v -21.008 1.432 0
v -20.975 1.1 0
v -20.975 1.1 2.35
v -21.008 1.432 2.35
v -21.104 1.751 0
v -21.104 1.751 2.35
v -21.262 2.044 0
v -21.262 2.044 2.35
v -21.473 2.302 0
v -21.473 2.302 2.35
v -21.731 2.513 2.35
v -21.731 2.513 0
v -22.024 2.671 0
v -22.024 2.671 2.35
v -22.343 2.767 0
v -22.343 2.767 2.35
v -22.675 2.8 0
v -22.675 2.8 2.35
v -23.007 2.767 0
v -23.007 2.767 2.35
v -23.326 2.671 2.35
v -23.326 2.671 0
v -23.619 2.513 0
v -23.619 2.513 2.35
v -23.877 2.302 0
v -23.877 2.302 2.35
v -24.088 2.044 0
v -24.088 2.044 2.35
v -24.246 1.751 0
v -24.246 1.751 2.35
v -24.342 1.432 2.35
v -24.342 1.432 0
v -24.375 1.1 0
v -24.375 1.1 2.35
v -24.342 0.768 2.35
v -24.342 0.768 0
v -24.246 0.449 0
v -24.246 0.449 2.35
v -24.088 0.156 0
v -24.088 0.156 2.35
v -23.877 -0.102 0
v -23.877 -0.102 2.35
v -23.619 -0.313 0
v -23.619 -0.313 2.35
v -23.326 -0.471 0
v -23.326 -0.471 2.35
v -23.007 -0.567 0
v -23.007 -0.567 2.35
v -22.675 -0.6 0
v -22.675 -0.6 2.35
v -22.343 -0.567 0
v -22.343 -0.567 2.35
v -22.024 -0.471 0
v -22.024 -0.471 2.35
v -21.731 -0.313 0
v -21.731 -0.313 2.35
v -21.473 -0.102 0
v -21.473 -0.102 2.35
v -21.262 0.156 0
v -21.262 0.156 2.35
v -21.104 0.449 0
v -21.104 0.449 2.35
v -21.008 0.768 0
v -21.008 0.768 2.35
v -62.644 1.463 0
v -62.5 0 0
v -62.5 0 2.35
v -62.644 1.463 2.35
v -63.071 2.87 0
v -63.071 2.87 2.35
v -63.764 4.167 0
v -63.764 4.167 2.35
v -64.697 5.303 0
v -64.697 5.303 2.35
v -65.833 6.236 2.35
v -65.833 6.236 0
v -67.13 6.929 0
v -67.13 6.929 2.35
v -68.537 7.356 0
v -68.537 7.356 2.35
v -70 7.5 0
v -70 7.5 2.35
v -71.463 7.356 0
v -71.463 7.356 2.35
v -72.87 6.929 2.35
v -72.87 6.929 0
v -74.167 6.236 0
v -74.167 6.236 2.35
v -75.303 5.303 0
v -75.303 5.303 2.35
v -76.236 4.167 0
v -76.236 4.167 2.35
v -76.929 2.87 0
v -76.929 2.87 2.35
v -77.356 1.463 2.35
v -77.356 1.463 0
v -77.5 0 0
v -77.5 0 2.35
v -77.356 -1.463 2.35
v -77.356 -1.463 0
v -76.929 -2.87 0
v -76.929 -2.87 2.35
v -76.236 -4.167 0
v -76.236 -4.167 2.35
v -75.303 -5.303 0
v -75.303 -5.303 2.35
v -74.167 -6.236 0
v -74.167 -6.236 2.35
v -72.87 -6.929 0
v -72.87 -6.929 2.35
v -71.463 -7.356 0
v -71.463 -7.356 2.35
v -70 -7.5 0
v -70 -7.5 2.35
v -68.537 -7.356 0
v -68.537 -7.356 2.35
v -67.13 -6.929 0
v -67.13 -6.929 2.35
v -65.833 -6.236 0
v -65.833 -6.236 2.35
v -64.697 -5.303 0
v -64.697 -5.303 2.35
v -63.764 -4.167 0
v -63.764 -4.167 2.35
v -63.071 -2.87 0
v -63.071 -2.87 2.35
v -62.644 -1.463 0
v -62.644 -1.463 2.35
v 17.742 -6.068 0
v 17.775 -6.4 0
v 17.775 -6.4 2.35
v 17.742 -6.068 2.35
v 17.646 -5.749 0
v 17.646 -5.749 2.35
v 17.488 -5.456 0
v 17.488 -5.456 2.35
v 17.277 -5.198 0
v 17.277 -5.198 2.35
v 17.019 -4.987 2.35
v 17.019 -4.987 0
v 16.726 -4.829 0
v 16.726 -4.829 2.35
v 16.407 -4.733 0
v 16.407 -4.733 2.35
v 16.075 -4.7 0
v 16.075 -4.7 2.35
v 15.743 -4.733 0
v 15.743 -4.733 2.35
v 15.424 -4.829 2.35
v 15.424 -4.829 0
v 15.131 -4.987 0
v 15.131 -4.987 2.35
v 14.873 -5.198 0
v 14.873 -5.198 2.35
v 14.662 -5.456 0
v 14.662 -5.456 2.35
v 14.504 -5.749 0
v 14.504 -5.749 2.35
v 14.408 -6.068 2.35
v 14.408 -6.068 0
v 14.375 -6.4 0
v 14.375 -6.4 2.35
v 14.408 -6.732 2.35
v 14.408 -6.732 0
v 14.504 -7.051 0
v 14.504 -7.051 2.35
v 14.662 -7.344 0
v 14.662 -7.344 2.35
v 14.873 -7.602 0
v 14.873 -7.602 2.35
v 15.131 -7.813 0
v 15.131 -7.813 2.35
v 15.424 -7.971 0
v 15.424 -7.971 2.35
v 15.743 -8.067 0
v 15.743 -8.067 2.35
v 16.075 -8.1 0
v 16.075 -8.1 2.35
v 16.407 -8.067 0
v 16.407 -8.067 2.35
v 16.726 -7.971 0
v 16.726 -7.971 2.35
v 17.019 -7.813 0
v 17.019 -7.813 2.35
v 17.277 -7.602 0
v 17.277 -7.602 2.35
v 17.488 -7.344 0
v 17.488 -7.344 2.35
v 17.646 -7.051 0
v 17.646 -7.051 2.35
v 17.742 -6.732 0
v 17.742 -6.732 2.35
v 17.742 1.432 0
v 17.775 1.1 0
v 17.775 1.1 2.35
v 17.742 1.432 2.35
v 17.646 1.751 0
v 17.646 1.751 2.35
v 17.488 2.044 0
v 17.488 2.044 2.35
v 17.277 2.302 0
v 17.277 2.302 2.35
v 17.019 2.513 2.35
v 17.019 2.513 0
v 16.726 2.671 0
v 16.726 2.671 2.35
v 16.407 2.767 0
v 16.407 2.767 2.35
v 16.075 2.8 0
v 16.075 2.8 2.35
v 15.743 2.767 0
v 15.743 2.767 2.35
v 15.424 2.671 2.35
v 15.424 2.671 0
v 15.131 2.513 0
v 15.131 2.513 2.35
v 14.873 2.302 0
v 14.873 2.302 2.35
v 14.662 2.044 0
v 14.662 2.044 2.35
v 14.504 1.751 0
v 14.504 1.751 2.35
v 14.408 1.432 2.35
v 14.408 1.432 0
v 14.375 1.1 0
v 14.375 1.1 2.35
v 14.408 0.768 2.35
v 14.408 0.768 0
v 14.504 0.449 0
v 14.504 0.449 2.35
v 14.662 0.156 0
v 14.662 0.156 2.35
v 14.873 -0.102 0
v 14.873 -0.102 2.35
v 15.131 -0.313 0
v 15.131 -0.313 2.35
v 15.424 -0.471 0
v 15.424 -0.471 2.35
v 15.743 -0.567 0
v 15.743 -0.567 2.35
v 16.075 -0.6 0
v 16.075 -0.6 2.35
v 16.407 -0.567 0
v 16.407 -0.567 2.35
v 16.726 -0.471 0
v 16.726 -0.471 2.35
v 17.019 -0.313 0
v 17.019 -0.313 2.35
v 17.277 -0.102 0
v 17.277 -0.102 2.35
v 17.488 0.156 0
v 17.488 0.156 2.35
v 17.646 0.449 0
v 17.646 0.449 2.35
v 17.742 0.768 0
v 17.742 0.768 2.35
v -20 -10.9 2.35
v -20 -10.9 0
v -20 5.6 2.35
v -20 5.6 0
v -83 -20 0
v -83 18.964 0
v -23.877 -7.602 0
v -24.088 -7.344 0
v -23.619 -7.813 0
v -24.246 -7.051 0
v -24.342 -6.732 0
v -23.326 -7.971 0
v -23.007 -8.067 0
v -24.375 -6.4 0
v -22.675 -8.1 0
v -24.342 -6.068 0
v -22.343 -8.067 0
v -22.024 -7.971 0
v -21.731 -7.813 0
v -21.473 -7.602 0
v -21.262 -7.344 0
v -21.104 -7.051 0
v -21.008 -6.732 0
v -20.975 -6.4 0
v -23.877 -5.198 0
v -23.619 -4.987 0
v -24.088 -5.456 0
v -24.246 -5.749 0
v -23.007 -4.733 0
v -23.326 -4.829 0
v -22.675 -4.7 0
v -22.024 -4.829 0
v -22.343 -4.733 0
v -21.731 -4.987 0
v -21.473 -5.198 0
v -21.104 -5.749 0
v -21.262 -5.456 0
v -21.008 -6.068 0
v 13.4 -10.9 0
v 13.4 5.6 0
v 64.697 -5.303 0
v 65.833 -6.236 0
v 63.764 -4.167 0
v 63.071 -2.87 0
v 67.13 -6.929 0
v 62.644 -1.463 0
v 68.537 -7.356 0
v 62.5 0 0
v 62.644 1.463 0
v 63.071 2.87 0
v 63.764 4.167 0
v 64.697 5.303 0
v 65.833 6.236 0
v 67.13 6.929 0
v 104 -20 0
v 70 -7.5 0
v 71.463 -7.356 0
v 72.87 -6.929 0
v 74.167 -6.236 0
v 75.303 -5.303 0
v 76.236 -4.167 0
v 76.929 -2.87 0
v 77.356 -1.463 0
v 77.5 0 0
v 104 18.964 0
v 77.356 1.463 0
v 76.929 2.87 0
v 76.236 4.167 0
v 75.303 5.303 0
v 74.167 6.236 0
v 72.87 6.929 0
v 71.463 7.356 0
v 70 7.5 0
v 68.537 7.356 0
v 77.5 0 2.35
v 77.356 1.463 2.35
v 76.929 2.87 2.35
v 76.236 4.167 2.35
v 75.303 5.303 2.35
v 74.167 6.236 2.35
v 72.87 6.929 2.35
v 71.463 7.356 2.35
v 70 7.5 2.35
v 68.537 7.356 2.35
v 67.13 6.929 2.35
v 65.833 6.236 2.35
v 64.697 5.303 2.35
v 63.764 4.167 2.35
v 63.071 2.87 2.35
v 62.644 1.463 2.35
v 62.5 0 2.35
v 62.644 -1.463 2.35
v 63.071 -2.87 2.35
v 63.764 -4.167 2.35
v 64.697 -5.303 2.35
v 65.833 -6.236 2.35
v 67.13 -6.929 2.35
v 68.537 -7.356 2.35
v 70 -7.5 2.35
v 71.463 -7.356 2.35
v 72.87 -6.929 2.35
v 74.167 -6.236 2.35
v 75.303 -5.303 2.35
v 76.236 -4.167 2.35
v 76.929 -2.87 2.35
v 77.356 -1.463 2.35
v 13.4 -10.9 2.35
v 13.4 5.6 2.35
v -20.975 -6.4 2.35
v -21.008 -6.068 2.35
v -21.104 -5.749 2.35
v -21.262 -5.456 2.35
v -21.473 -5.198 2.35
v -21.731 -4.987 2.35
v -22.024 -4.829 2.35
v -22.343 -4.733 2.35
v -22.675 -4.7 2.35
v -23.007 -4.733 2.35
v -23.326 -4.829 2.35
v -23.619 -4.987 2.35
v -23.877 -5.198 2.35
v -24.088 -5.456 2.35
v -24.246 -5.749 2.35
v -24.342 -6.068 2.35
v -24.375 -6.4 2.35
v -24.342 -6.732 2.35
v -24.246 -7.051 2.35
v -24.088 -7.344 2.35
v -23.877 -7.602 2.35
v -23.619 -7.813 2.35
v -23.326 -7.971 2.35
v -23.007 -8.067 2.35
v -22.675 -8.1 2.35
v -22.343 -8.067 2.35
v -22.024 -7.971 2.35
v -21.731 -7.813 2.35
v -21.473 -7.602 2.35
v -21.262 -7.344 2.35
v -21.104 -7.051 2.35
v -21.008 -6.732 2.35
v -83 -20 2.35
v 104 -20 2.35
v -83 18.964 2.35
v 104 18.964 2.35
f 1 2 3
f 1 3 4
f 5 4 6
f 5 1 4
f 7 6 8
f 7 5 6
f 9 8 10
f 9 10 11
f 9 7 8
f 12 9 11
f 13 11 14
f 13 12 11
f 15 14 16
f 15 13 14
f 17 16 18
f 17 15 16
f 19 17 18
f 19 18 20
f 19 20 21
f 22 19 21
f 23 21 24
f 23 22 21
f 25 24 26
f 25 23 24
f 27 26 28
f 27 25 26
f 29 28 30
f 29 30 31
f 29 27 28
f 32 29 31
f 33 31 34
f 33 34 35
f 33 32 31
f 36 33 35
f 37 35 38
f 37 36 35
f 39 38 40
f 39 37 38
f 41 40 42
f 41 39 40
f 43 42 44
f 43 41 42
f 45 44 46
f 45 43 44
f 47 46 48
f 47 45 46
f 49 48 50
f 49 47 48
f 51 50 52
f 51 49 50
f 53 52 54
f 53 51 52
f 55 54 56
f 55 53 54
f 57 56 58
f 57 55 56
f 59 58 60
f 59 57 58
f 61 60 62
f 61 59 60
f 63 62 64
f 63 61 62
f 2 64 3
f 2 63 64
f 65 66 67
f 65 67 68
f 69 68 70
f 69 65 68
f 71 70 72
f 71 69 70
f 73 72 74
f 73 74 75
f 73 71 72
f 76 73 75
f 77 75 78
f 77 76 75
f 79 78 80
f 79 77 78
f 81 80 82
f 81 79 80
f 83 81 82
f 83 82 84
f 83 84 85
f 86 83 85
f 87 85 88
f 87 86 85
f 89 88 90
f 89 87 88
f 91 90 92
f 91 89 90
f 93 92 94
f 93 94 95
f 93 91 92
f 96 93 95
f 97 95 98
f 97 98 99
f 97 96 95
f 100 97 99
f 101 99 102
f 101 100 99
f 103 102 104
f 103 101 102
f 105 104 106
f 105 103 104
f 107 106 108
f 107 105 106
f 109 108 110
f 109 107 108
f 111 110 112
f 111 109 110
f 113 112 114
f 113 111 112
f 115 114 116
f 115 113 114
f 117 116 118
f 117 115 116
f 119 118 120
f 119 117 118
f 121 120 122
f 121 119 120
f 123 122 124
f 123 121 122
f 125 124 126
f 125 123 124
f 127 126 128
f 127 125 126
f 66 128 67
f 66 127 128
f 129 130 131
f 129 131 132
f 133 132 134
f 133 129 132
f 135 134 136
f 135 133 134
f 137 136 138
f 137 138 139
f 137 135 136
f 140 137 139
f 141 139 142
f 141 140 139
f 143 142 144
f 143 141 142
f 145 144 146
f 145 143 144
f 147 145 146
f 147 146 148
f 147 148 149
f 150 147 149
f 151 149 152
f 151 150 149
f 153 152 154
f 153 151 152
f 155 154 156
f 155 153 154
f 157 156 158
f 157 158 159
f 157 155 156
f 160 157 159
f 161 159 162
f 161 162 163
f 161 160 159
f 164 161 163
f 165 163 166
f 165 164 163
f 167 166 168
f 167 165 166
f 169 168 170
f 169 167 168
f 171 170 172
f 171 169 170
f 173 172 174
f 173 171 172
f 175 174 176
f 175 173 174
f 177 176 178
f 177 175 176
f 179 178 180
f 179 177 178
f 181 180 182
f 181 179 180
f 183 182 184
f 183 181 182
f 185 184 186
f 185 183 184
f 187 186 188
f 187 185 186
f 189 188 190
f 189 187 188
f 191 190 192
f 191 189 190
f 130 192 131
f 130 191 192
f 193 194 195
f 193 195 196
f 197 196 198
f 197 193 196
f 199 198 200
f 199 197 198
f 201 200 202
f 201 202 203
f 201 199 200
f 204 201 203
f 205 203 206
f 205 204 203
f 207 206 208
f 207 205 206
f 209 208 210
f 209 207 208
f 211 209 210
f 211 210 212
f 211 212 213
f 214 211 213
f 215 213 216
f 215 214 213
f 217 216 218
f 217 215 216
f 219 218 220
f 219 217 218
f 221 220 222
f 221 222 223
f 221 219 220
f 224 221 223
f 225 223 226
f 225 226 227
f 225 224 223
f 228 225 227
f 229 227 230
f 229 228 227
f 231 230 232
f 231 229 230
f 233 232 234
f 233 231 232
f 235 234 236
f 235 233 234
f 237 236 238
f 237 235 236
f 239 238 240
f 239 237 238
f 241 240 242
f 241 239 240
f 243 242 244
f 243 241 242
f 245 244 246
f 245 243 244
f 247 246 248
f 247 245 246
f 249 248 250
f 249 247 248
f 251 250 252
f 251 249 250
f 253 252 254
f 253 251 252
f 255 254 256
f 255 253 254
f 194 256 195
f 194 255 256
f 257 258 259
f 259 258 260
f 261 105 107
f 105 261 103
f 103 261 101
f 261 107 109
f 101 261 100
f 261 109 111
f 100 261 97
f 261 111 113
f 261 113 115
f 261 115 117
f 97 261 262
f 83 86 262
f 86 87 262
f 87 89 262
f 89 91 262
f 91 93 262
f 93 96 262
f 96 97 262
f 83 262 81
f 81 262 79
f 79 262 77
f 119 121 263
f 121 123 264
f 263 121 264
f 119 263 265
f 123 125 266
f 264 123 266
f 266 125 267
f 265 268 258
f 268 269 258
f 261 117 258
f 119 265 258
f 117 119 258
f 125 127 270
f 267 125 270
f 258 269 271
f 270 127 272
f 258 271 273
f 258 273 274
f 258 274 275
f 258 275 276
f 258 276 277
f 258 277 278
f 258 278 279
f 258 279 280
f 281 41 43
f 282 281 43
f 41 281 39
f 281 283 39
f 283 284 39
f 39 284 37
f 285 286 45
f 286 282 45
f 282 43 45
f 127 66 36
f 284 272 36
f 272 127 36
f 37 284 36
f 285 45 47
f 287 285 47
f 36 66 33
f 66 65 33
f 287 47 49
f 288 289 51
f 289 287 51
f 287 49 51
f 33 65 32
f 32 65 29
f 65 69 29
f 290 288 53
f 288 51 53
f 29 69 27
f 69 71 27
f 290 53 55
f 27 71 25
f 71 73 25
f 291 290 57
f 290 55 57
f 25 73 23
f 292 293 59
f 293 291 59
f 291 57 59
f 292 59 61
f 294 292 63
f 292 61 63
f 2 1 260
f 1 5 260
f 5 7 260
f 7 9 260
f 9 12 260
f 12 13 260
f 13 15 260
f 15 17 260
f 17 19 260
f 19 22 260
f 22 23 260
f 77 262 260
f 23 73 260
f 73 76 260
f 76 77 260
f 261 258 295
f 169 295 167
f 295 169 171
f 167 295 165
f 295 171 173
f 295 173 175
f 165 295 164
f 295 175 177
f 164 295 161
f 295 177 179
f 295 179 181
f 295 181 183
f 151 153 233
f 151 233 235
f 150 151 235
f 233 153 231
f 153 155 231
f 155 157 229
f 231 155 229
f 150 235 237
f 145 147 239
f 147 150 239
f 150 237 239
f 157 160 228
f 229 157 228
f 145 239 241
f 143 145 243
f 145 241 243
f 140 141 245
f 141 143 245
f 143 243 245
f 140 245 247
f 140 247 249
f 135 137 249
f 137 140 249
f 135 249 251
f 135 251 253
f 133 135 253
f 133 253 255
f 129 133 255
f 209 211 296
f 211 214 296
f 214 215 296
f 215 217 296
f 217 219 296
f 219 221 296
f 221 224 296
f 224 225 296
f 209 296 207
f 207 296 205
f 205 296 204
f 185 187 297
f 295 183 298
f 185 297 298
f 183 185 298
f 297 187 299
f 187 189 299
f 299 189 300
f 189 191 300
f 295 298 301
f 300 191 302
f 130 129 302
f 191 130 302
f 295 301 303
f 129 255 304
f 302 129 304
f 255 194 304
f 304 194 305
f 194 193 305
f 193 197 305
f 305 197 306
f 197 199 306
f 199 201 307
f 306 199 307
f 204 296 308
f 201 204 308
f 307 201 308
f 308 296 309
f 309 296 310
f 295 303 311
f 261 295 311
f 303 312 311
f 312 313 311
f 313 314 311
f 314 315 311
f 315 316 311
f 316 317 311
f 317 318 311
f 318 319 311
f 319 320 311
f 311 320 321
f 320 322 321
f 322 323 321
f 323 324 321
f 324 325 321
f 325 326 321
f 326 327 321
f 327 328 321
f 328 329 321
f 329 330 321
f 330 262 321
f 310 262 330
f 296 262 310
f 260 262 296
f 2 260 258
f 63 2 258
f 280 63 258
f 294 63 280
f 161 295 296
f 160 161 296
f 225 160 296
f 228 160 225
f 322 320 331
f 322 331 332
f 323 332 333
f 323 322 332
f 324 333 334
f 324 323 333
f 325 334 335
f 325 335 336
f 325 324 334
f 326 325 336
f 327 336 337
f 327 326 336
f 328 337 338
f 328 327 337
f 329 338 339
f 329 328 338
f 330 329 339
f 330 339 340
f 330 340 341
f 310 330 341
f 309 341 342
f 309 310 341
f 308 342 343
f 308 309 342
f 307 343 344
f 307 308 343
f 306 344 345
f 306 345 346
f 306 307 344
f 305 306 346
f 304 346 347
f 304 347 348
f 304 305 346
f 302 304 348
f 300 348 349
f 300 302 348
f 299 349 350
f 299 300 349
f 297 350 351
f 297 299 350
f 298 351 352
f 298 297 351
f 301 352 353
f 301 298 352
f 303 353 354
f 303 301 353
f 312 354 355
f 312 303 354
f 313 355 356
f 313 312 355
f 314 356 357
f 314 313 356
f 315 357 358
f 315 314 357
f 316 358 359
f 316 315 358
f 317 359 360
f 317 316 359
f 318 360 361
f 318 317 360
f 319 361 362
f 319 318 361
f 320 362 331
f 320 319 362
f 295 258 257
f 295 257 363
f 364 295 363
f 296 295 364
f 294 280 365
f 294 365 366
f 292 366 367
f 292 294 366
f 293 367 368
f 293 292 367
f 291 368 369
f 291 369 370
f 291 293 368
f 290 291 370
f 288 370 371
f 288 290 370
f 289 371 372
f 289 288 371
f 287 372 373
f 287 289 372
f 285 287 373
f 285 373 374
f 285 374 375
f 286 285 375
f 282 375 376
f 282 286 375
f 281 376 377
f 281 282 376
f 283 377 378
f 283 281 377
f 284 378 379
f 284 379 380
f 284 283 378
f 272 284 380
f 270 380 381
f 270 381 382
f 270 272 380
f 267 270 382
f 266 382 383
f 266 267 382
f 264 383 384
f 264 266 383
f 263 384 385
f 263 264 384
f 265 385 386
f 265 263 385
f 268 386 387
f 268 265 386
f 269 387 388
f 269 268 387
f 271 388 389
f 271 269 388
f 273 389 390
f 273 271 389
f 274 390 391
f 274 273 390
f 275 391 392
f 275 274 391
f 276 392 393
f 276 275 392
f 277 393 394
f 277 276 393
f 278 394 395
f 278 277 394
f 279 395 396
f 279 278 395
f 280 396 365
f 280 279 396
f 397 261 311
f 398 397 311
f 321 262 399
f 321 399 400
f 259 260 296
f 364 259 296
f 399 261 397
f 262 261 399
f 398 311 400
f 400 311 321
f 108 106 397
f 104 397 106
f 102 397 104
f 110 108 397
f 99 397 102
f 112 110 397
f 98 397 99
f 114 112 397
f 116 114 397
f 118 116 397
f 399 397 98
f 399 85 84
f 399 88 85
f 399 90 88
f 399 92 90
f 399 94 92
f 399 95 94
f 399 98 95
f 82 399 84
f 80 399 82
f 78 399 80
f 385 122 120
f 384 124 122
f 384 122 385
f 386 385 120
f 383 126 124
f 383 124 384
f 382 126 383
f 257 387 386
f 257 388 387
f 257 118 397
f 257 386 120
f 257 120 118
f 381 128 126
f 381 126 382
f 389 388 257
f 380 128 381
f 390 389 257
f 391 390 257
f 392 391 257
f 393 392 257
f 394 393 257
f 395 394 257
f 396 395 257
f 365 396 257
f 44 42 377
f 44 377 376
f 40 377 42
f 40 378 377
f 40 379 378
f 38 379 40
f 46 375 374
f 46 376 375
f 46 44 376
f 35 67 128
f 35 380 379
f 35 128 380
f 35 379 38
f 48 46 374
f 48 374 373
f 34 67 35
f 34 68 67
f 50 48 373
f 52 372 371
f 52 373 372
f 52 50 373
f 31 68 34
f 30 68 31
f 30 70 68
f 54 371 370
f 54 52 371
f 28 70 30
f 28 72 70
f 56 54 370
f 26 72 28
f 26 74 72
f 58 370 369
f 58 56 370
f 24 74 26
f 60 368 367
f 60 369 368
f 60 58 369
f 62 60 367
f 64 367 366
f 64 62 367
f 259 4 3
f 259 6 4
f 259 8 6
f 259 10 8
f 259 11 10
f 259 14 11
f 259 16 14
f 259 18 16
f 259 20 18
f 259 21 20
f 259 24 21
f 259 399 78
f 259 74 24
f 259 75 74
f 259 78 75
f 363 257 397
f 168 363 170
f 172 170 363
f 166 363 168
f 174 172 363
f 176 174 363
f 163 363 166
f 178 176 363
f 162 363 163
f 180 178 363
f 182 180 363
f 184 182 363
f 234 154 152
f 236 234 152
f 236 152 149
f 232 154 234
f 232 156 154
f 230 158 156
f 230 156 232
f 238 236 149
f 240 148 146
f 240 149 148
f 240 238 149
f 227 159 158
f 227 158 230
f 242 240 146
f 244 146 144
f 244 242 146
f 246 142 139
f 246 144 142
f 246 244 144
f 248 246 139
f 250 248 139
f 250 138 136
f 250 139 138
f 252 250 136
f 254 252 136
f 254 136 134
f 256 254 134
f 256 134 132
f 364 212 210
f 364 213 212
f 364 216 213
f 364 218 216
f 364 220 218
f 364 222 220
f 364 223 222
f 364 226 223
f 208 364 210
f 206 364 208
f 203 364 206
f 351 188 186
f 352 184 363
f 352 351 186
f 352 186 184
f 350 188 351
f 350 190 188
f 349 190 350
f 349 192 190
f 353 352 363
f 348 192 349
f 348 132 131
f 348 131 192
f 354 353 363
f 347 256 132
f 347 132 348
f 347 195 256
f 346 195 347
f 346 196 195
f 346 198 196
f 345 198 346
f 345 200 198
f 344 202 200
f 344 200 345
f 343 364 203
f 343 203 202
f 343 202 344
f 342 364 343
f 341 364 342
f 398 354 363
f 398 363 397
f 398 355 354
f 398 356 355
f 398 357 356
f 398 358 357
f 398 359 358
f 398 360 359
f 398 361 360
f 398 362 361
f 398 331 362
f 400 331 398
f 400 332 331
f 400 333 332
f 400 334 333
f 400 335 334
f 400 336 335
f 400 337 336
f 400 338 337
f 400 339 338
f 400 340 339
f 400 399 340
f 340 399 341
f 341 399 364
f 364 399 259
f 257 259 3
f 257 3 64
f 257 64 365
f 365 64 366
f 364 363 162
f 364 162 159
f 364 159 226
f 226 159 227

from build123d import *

# Parameters (mm, degrees)
F0_W     = 187
F0_H     = 38.963933
F0_R     = 1.7
F0_W_2   = 33.4
F0_H_2   = 16.5
F0_R_2   = 7.5
F1_DEPTH = 2.35


with BuildPart() as f1:
    # F0 (on Top) → F1 (new body)
    with BuildSketch(Plane.XY):
        with Locations((10.5, -0.518033)):
            Rectangle(F0_W, F0_H)
        with Locations((-22.675, -6.4)):
            Circle(F0_R, mode=Mode.SUBTRACT)
        with Locations((-3.3, -2.65)):
            Rectangle(F0_W_2, F0_H_2, mode=Mode.SUBTRACT)
        with Locations((16.075, -6.4)):
            Circle(F0_R, mode=Mode.SUBTRACT)
        with Locations((-70, 0)):
            Circle(F0_R_2, mode=Mode.SUBTRACT)
        with Locations((-22.675, 1.1)):
            Circle(F0_R, mode=Mode.SUBTRACT)
        with Locations((16.075, 1.1)):
            Circle(F0_R, mode=Mode.SUBTRACT)
        with Locations((70, 0)):
            Circle(F0_R_2, mode=Mode.SUBTRACT)
    extrude(amount=F1_DEPTH)


solid = f1.part
